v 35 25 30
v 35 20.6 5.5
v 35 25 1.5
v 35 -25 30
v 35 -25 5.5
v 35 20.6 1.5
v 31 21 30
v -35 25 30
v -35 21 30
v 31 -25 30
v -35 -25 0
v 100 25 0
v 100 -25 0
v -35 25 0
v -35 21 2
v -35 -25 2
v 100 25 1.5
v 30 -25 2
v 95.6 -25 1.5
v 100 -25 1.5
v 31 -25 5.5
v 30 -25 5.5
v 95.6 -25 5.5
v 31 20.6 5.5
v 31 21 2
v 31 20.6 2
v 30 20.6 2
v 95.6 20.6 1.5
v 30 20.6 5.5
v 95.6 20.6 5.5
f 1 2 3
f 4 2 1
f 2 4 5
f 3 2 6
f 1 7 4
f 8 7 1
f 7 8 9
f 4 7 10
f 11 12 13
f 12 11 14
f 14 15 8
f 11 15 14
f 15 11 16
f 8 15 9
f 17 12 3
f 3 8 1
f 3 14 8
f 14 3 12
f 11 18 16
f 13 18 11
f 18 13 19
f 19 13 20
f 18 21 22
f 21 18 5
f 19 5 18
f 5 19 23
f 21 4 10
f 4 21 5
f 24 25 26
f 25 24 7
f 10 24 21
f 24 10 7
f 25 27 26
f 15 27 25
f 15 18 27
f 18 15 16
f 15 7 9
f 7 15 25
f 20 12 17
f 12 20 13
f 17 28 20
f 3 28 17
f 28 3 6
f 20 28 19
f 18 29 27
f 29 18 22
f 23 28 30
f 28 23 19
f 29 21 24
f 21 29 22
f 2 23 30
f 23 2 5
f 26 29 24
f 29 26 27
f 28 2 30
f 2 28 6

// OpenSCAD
// Two-part enclosure for small electronics board
// Print orientation: box upright, lid upside down (lip on top)

// ---- Parameters ----
box_x      = 70;    // box outer length (X)
box_y      = 50;    // box outer width (Y)
box_z      = 30;    // box outer height (Z)
box_w      = 2;     // box wall thickness
box_floor  = 2;     // box floor thickness
gap        = 10;    // gap between box and lid
lip_t      = 1.5;   // lid lip thickness (wall)
lip_h      = 4;     // lid lip height
eps        = 0.5;   // cutter overshoot

$fn = 64;

// ---- Derived ----
box_id_x = box_x - 2*box_w;   // inner length
box_id_y = box_y - 2*box_w;   // inner width
lip_o_x  = box_id_x - 0.4;    // lip outer length (0.2 clearance each side)
lip_o_y  = box_id_y - 0.4;    // lip outer width (0.2 clearance each side)

// ---- Model ----
union() {
    // Box
    translate([-box_x/2, -box_y/2, 0])
        difference() {
            cube([box_x, box_y, box_z]);
            translate([0, 0, box_floor])
                cube([box_id_x, box_id_y, box_z - box_floor + eps]);
        }

    // Lid (upside down)
    translate([(box_x - gap)/2, -box_y/2, 0])
        union() {
            // Plate
            cube([box_x, box_y, lip_t]);
            // Lip
            translate([0, 0, lip_t])
                cube([lip_o_x, lip_o_y, lip_h]);
        }
}
